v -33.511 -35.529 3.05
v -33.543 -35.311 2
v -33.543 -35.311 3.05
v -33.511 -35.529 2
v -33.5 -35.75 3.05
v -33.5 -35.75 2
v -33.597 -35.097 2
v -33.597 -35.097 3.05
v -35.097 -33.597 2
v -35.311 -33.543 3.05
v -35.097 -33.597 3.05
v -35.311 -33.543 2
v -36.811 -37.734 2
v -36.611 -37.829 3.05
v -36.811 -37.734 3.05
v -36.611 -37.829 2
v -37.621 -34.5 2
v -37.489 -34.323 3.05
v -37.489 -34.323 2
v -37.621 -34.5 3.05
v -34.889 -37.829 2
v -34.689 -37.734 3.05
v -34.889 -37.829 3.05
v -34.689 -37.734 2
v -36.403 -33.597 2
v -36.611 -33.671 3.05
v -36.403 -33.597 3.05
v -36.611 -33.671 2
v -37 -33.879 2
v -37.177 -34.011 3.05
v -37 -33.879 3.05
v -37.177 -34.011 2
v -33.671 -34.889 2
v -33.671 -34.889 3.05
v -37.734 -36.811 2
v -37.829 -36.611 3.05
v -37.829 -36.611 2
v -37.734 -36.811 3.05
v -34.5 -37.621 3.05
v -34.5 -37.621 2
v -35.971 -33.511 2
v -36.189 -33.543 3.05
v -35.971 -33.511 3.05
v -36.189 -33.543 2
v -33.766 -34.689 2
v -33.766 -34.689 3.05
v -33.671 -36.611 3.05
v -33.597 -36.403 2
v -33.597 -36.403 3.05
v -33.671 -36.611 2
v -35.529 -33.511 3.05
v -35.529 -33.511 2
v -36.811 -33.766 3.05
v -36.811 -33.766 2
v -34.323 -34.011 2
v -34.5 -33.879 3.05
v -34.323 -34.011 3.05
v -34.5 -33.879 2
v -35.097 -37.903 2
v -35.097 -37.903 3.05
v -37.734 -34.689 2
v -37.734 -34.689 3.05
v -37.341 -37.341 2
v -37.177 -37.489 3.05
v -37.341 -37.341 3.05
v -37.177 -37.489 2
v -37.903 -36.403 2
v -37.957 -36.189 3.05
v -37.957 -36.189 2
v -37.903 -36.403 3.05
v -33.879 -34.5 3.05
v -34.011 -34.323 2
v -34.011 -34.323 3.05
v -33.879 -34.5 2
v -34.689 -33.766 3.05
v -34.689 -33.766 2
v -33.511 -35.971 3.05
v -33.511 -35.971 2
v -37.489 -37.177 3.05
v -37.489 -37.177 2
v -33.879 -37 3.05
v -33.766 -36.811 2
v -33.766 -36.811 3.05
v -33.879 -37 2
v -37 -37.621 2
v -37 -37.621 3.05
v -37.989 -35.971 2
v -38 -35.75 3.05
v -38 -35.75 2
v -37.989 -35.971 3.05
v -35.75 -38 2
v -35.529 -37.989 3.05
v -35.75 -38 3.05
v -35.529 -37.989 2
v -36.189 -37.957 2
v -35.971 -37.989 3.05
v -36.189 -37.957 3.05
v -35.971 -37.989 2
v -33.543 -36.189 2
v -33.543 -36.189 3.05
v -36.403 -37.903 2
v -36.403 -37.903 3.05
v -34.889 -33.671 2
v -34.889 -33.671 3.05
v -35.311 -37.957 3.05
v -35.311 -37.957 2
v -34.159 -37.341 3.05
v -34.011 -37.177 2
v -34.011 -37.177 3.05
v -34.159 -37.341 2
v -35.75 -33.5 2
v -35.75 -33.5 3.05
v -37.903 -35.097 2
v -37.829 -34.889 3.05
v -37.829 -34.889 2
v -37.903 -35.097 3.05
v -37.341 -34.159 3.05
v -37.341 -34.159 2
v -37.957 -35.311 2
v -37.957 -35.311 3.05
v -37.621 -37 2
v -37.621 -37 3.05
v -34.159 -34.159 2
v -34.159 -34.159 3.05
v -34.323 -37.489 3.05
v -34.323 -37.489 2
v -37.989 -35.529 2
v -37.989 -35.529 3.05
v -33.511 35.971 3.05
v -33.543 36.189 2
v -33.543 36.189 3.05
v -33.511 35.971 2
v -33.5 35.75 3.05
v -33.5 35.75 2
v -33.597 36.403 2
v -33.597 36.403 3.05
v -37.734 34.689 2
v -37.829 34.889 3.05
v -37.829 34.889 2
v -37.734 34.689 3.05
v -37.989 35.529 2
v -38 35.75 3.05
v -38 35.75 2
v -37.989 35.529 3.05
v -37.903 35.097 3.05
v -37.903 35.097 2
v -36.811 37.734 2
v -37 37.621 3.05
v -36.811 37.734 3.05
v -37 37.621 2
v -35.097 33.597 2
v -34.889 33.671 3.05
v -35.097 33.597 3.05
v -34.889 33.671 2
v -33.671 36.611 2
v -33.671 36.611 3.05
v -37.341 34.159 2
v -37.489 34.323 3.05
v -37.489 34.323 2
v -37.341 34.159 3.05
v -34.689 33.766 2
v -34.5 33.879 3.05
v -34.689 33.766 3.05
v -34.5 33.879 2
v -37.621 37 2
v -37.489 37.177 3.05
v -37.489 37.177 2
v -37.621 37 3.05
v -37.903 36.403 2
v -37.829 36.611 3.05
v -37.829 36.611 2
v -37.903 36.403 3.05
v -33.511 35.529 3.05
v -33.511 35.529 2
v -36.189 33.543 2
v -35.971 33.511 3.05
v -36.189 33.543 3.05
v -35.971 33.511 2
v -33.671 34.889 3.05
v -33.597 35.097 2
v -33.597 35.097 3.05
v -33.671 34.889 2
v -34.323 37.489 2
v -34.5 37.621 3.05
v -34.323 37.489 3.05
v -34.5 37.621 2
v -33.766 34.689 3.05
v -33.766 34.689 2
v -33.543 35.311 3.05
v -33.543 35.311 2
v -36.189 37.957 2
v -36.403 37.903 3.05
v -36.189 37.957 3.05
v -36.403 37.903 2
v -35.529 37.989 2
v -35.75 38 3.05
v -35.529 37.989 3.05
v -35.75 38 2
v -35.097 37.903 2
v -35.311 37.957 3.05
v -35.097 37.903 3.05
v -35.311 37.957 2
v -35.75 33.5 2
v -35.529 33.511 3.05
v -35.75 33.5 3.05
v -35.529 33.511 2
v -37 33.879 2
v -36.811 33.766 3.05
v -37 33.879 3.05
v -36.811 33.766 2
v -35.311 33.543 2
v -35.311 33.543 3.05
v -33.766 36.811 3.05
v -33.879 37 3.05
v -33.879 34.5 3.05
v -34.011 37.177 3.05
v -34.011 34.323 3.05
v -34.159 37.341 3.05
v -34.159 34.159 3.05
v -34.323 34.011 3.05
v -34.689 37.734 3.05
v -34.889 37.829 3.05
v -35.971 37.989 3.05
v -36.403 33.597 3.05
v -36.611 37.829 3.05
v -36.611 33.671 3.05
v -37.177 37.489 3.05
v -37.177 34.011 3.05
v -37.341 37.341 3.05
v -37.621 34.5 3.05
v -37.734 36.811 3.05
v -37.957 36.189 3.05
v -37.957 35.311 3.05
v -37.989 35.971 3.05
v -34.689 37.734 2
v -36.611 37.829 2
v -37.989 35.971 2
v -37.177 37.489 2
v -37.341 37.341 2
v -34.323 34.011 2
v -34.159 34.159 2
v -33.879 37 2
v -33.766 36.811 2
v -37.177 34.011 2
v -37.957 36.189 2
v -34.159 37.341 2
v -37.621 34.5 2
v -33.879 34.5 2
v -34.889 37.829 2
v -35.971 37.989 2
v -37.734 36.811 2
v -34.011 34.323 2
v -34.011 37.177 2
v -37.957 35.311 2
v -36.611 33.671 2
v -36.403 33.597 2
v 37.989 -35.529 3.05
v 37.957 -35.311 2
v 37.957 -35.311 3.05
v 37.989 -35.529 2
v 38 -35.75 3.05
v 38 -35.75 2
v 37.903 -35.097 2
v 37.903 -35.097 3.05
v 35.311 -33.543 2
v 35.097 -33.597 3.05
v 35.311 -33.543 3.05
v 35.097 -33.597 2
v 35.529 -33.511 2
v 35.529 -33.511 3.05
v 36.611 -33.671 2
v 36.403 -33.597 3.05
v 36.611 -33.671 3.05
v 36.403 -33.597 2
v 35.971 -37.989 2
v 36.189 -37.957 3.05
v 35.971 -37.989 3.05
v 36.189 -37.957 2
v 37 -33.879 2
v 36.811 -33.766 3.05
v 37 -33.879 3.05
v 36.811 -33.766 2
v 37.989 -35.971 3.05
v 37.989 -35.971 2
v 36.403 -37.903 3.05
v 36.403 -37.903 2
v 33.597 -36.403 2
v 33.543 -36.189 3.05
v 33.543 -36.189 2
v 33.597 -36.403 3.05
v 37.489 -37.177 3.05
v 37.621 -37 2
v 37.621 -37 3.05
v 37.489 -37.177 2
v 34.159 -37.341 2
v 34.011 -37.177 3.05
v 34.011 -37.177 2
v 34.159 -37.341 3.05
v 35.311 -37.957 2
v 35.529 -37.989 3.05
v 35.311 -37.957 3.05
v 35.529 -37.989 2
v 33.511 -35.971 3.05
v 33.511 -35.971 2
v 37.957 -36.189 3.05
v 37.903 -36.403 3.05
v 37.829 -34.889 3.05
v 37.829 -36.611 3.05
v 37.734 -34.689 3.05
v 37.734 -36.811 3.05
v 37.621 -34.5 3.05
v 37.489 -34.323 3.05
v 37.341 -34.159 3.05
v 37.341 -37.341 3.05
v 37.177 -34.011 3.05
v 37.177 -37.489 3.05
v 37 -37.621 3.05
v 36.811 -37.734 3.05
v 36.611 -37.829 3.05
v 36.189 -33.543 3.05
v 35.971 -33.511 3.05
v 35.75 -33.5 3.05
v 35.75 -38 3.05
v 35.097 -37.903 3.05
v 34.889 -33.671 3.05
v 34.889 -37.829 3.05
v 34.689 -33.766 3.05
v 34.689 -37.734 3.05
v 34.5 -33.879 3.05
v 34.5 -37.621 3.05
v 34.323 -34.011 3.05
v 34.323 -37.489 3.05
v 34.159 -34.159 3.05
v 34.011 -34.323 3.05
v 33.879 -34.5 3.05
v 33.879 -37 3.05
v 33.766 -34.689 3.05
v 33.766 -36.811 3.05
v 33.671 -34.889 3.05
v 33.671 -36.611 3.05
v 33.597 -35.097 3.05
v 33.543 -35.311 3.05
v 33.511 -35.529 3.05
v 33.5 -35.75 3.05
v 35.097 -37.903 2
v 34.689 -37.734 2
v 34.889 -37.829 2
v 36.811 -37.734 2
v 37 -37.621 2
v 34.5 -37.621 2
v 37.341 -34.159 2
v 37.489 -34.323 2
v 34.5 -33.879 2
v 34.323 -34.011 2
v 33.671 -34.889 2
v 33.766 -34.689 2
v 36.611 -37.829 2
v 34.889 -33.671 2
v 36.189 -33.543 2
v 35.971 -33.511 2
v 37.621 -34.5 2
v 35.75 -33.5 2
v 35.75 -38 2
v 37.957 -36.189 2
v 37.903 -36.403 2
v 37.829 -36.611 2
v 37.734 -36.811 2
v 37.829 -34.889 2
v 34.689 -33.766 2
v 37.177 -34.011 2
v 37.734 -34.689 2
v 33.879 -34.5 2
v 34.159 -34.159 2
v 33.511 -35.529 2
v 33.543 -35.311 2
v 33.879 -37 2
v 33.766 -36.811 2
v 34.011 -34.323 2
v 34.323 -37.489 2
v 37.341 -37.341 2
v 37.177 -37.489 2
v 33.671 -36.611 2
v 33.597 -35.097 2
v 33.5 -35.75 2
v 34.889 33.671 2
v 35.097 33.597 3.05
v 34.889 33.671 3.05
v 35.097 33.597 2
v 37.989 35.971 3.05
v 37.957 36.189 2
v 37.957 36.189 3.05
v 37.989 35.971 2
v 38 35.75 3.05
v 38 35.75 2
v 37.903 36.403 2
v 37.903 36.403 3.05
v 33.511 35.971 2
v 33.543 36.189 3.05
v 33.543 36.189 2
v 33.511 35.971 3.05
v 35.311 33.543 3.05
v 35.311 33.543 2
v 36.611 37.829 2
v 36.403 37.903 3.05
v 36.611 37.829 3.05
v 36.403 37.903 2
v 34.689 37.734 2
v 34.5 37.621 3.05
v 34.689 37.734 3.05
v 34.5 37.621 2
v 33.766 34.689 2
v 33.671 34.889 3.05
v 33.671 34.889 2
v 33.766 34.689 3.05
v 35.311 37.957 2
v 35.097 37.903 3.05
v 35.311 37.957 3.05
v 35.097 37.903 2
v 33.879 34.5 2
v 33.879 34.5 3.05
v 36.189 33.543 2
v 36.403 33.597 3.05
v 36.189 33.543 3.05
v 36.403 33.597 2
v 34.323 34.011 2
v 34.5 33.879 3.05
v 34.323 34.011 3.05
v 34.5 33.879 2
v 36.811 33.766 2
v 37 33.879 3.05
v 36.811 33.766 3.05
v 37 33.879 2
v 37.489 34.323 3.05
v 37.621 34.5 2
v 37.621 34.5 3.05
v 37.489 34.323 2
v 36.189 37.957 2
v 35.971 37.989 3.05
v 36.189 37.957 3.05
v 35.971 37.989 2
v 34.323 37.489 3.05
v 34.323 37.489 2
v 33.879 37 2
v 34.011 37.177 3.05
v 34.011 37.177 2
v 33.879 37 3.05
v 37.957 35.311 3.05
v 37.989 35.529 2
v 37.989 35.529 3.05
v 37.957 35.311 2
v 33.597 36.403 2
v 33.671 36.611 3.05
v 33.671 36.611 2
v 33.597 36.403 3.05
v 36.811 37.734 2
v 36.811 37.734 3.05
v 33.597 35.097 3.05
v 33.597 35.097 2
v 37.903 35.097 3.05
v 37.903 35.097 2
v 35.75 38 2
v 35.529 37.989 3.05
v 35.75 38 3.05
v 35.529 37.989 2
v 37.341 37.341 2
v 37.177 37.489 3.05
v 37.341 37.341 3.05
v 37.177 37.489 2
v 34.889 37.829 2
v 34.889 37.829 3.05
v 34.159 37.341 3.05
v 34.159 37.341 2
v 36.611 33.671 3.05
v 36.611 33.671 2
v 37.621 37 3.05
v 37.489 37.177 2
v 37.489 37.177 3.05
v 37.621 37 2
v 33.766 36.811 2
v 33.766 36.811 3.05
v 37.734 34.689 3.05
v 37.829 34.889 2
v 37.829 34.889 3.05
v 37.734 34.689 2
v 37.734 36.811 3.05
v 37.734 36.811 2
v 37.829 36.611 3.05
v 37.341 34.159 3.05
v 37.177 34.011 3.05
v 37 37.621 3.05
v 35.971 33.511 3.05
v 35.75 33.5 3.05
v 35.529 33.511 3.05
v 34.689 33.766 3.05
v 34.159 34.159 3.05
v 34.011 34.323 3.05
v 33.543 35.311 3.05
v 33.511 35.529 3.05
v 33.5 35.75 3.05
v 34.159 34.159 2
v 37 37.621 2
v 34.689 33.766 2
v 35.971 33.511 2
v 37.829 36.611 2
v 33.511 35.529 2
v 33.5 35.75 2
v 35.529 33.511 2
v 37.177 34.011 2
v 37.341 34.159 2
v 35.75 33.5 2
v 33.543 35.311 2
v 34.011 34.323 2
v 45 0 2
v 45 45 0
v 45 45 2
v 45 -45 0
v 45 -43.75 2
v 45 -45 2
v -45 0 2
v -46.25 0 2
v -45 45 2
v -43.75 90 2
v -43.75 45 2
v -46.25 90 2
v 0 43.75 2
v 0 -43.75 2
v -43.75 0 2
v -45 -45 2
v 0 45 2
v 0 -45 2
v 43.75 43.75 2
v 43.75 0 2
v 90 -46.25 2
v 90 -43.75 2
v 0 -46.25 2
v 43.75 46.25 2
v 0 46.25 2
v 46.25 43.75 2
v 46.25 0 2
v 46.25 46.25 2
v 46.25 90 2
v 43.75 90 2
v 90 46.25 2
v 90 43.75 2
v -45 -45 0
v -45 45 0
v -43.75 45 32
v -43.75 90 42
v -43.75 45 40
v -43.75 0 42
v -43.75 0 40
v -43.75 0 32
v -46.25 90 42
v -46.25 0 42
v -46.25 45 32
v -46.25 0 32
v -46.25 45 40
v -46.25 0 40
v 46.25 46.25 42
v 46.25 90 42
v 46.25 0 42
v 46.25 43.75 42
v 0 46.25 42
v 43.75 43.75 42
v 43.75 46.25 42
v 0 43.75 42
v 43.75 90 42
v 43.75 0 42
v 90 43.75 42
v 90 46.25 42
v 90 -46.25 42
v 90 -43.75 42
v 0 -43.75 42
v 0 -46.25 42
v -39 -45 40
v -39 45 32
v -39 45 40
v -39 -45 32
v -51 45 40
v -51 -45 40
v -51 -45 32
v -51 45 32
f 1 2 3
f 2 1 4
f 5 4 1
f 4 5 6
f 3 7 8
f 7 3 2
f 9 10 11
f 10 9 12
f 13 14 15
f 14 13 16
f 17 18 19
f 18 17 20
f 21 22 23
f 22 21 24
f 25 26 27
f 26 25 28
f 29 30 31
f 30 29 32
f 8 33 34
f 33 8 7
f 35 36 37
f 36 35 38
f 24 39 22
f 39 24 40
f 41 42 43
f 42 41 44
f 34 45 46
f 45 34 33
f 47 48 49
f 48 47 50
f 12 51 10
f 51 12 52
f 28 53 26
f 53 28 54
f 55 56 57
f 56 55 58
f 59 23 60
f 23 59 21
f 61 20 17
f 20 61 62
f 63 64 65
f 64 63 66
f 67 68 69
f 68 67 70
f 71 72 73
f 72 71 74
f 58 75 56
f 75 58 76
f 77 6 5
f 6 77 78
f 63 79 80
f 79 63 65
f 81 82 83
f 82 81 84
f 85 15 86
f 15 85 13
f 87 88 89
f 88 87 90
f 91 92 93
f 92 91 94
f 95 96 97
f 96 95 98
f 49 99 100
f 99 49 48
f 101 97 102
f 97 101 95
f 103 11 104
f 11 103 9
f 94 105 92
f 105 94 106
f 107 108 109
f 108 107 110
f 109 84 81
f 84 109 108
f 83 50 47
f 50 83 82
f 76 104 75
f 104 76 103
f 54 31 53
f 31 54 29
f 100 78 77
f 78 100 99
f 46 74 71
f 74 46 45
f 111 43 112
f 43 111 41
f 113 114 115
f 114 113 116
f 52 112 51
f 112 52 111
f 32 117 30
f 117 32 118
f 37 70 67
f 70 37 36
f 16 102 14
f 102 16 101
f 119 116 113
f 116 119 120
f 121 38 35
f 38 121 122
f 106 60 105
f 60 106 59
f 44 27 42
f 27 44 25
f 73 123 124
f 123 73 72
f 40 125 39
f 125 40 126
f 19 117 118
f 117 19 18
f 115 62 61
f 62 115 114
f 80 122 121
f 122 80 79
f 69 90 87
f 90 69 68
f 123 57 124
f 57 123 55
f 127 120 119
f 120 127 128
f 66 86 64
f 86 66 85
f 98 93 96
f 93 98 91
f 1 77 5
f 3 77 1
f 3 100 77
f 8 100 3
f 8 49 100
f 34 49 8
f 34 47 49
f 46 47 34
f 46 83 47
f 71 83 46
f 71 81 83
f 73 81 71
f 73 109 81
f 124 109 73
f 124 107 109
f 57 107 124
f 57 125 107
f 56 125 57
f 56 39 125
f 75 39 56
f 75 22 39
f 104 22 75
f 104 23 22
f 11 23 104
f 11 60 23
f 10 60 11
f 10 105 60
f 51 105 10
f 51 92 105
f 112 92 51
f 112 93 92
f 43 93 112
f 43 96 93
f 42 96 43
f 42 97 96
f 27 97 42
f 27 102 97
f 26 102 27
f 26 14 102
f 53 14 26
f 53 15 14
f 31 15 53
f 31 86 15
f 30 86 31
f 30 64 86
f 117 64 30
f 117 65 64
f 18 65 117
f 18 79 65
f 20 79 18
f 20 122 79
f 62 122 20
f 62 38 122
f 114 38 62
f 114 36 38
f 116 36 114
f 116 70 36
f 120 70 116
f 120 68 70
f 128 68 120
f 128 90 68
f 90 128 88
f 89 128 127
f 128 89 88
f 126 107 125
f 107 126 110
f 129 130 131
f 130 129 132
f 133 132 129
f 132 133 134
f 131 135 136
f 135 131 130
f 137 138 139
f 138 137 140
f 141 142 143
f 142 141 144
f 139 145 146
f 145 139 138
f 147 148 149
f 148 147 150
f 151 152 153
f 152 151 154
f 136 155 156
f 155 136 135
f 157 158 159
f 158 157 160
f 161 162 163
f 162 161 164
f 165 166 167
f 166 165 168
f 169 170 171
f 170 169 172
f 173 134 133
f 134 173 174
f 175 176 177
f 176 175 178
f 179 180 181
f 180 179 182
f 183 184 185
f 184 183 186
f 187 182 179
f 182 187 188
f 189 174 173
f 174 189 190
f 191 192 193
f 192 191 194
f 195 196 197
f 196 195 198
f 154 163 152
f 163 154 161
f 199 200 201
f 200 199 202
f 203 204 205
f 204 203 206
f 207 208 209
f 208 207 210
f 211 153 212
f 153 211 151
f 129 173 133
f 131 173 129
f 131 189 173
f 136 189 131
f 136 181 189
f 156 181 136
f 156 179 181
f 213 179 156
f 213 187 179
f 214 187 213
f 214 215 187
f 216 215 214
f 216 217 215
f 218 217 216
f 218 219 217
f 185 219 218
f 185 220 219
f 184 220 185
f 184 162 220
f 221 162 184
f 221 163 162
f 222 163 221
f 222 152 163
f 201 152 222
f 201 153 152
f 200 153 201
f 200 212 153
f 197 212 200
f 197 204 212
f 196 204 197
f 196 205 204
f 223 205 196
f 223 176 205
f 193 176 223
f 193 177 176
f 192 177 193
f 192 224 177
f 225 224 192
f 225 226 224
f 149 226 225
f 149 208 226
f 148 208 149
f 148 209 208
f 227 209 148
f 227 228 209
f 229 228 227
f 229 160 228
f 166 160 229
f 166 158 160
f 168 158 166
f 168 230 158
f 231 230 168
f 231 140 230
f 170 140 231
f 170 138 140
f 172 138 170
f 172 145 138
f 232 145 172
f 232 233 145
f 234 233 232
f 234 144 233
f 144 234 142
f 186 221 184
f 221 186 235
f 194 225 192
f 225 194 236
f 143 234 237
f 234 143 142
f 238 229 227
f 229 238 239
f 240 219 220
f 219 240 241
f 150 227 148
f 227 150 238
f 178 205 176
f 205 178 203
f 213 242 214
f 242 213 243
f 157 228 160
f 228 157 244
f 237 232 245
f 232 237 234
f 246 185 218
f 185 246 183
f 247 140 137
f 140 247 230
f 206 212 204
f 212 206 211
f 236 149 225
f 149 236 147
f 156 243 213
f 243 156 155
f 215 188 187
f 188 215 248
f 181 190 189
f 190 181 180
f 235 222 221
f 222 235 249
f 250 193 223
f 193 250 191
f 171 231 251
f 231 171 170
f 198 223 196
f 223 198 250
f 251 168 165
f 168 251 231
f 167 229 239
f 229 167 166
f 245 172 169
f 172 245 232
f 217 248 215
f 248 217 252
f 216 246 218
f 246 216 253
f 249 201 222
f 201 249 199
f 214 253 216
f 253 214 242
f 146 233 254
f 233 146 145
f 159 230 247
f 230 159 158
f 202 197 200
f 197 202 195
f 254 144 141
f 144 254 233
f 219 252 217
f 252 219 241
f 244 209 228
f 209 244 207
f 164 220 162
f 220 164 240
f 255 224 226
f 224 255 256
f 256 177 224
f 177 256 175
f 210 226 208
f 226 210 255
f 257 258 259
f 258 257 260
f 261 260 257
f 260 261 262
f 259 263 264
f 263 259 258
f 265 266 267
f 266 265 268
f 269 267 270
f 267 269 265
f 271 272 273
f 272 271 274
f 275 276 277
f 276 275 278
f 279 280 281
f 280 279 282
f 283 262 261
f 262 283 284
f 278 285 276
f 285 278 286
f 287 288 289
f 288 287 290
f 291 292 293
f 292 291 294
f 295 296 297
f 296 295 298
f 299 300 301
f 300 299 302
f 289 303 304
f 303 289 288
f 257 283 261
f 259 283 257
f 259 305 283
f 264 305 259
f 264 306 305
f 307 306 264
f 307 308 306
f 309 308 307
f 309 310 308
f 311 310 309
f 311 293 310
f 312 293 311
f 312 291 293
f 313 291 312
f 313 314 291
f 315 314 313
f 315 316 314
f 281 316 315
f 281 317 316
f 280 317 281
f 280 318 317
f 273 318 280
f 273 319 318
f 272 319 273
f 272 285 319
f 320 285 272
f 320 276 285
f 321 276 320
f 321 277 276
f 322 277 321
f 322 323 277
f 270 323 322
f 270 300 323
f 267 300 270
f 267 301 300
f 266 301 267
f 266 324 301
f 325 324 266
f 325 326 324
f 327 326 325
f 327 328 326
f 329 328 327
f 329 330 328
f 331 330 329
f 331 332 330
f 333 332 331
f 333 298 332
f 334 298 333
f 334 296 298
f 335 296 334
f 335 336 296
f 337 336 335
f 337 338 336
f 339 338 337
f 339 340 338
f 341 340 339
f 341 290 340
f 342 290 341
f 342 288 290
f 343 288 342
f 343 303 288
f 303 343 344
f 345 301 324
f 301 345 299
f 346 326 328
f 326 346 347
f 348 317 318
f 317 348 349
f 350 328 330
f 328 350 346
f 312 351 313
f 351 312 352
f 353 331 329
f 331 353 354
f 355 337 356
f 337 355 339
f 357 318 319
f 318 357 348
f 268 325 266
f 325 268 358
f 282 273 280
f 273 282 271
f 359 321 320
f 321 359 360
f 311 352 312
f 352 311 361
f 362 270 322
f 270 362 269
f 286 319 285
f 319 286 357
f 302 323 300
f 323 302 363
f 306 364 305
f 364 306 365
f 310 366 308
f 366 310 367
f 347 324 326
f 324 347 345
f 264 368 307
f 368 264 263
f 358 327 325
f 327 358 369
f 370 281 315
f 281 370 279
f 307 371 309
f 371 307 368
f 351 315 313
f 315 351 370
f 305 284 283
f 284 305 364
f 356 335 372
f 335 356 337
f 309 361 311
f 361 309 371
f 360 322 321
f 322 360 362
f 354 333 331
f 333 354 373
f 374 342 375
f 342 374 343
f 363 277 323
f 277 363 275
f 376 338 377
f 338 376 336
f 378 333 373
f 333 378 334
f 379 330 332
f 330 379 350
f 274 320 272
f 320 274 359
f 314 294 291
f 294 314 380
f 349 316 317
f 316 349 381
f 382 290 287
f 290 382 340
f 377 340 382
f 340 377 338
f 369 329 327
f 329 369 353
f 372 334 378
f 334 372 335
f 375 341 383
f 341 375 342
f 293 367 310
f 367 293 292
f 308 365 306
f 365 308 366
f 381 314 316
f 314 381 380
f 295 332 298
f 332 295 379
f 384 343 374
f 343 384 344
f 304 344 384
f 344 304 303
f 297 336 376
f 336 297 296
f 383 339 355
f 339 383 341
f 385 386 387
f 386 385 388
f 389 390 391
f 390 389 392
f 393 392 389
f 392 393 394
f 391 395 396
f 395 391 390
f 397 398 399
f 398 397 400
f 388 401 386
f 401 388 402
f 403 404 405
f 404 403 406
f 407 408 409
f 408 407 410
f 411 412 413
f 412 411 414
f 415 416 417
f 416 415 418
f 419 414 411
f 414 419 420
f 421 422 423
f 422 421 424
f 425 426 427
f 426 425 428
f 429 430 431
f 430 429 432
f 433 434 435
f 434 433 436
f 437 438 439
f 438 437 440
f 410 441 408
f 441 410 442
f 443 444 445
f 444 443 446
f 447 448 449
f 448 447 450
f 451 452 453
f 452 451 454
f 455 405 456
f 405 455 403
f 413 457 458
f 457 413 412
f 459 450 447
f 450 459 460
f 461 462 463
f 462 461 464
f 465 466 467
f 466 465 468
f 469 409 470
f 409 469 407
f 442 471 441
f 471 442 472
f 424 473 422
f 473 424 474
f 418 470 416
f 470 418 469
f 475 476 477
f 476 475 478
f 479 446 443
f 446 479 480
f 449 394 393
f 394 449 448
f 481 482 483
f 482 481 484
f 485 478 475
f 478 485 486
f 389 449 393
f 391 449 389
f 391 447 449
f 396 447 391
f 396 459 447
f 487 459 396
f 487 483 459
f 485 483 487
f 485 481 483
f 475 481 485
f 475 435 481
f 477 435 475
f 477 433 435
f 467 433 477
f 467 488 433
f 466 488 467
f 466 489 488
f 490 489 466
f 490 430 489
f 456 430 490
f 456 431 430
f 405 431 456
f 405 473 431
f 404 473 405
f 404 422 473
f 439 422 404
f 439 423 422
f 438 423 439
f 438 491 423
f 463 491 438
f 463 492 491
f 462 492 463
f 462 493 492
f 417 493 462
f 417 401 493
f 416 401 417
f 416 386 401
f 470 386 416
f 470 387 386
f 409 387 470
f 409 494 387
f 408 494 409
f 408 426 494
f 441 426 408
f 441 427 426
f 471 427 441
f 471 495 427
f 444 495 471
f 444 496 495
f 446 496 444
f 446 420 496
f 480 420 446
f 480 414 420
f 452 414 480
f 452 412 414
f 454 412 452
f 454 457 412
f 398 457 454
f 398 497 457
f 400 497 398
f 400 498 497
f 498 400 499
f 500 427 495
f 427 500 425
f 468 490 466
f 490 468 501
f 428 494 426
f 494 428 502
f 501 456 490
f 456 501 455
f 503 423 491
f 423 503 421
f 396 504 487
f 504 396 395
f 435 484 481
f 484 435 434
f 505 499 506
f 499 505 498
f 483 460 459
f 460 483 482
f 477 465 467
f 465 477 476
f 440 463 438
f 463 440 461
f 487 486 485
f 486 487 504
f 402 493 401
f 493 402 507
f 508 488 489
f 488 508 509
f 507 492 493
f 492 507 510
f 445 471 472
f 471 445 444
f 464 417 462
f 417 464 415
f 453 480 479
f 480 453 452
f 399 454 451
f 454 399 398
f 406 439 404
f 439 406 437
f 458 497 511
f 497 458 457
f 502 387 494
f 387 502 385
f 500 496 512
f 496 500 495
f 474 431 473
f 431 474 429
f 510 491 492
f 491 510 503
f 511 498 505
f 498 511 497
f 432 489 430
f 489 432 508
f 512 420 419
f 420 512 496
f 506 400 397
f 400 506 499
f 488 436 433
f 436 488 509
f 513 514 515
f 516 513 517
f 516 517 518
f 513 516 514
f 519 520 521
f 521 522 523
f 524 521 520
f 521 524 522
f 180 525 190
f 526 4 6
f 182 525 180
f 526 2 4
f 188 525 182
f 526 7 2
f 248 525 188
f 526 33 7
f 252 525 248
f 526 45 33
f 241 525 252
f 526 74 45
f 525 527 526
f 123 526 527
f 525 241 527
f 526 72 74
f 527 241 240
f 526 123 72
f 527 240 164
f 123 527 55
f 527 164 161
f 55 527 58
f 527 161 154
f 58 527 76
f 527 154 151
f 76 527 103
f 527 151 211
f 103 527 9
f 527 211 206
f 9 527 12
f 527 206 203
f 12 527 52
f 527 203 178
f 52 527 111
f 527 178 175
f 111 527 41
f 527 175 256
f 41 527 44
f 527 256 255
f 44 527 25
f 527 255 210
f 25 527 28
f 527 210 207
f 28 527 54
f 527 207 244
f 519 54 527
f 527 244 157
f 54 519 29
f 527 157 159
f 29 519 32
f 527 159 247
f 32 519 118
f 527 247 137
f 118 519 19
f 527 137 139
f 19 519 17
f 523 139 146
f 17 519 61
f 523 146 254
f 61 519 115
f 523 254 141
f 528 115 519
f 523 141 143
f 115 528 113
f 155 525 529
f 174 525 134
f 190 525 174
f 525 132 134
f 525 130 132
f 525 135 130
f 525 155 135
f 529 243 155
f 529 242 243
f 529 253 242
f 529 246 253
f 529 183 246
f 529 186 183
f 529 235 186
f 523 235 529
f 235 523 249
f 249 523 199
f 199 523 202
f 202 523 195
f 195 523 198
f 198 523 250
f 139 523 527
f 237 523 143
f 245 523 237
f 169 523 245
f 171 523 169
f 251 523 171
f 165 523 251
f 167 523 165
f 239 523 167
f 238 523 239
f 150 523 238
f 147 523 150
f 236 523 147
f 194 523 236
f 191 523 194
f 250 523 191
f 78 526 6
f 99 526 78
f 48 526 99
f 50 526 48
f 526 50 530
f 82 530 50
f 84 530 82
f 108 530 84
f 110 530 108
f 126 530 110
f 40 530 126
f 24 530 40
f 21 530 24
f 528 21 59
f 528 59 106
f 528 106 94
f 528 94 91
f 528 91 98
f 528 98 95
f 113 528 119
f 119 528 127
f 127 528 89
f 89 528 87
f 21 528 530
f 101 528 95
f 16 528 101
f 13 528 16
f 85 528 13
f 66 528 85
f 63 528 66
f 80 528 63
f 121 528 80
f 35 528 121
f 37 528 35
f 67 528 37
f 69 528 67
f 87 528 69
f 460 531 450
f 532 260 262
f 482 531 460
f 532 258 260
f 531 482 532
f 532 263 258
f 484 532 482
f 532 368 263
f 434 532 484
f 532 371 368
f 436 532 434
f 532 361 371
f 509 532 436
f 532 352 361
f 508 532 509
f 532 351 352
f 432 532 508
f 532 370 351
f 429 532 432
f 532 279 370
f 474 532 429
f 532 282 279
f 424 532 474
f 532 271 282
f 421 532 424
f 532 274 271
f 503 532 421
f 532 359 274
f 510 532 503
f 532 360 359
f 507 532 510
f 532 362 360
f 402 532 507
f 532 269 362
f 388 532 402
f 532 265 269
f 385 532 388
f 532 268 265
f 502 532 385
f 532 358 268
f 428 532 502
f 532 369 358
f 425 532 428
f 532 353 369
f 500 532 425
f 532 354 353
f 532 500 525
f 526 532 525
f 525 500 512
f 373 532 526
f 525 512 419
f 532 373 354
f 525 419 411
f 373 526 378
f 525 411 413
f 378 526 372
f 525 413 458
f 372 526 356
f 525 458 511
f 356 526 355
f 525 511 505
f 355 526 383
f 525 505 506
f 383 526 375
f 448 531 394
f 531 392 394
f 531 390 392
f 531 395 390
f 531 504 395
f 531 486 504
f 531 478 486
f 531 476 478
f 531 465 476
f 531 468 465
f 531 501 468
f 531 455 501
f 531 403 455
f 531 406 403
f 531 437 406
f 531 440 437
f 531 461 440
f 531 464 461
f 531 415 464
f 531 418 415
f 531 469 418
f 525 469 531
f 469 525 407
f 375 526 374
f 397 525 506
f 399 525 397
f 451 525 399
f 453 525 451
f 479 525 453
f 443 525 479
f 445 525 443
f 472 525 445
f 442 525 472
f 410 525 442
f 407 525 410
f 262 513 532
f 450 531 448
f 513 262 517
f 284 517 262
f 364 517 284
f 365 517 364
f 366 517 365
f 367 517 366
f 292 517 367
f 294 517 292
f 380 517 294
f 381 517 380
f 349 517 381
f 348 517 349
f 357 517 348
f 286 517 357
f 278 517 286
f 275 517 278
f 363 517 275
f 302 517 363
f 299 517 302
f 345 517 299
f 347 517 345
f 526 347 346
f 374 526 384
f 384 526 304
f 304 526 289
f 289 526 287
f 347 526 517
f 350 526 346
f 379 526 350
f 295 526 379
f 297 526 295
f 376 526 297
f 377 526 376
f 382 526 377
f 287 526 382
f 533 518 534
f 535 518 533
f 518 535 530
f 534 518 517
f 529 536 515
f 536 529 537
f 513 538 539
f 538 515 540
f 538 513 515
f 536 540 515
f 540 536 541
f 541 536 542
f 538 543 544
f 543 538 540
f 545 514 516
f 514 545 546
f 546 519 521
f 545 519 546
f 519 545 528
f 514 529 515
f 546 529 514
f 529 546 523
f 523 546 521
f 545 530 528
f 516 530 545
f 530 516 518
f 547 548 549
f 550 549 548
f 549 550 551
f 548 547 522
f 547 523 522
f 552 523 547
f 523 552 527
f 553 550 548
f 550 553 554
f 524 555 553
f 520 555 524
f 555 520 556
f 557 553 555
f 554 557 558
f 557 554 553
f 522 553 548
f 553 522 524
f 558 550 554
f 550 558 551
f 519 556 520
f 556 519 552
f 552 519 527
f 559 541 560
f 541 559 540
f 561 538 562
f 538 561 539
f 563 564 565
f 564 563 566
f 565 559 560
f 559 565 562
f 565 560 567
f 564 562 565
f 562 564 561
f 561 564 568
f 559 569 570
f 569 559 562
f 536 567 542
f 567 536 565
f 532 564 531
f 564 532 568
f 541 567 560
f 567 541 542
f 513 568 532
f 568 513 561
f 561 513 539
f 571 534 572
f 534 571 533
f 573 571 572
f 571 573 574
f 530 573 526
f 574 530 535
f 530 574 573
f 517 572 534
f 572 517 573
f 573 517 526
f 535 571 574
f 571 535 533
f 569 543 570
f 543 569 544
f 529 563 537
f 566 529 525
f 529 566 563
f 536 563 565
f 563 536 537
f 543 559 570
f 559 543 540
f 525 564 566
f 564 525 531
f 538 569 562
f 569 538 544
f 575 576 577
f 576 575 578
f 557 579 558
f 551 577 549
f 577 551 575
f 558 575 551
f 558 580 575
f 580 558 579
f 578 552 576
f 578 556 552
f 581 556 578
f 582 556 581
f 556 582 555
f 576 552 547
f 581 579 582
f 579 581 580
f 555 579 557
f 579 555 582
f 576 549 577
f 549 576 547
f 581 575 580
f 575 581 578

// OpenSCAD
$fn = 64;

// Dimensions (mm)
outer_size = 90;           // Outer X and Y size of the housing
plate_thickness = 2;       // Thickness of the top plate (stirring surface)
wall_thickness = 2.5;      // Thickness of the walls
wall_height = 40;          // Height of the walls
hole_diameter = 4.5;       // Diameter of mounting holes for M4 screws
hole_pattern_size = 71.5;  // Distance between hole centers (square pattern)
notch_width = 12;          // Width of the cable notch
notch_depth = 8;           // Depth of the cable notch
notch_z_start = 32;        // Z start of the notch (from bottom of wall)
notch_z_end = 40;          // Z end of the notch

// Main Housing Assembly
union() {
    // 1. Top Plate
    // Centered at z=0, thickness 2mm
    translate([0, 0, plate_thickness/2])
    cube([outer_size, outer_size, plate_thickness], center=true);

    // 2. Walls
    // Front Wall
    translate([-outer_size/2 - wall_thickness/2, 0, plate_thickness])
    cube([wall_thickness, outer_size, wall_height]);
    // Back Wall
    translate([outer_size/2 - wall_thickness/2, 0, plate_thickness])
    cube([wall_thickness, outer_size, wall_height]);
    // Left Wall
    translate([0, -outer_size/2 - wall_thickness/2, plate_thickness])
    cube([outer_size, wall_thickness, wall_height]);
    // Right Wall
    translate([0, outer_size/2 - wall_thickness/2, plate_thickness])
    cube([outer_size, wall_thickness, wall_height]);

    // 3. Fan Mounting Holes
    // Loop through the 4 corners of the 71.5mm square pattern
    for (x = [-hole_pattern_size/2, hole_pattern_size/2])
        for (y = [-hole_pattern_size/2, hole_pattern_size/2])
            translate([x, y, plate_thickness])
            cylinder(h=plate_thickness + 0.1, r=hole_diameter/2, center=true);
}

// 4. Cable Notch (Cutout)
// Cut from the Front Wall (negative X side)
// Centered on the wall (x = -outer_size/2)
translate([-outer_size/2, 0, (notch_z_start + notch_z_end)/2])
cube([notch_width, outer_size, notch_depth], center=true);
